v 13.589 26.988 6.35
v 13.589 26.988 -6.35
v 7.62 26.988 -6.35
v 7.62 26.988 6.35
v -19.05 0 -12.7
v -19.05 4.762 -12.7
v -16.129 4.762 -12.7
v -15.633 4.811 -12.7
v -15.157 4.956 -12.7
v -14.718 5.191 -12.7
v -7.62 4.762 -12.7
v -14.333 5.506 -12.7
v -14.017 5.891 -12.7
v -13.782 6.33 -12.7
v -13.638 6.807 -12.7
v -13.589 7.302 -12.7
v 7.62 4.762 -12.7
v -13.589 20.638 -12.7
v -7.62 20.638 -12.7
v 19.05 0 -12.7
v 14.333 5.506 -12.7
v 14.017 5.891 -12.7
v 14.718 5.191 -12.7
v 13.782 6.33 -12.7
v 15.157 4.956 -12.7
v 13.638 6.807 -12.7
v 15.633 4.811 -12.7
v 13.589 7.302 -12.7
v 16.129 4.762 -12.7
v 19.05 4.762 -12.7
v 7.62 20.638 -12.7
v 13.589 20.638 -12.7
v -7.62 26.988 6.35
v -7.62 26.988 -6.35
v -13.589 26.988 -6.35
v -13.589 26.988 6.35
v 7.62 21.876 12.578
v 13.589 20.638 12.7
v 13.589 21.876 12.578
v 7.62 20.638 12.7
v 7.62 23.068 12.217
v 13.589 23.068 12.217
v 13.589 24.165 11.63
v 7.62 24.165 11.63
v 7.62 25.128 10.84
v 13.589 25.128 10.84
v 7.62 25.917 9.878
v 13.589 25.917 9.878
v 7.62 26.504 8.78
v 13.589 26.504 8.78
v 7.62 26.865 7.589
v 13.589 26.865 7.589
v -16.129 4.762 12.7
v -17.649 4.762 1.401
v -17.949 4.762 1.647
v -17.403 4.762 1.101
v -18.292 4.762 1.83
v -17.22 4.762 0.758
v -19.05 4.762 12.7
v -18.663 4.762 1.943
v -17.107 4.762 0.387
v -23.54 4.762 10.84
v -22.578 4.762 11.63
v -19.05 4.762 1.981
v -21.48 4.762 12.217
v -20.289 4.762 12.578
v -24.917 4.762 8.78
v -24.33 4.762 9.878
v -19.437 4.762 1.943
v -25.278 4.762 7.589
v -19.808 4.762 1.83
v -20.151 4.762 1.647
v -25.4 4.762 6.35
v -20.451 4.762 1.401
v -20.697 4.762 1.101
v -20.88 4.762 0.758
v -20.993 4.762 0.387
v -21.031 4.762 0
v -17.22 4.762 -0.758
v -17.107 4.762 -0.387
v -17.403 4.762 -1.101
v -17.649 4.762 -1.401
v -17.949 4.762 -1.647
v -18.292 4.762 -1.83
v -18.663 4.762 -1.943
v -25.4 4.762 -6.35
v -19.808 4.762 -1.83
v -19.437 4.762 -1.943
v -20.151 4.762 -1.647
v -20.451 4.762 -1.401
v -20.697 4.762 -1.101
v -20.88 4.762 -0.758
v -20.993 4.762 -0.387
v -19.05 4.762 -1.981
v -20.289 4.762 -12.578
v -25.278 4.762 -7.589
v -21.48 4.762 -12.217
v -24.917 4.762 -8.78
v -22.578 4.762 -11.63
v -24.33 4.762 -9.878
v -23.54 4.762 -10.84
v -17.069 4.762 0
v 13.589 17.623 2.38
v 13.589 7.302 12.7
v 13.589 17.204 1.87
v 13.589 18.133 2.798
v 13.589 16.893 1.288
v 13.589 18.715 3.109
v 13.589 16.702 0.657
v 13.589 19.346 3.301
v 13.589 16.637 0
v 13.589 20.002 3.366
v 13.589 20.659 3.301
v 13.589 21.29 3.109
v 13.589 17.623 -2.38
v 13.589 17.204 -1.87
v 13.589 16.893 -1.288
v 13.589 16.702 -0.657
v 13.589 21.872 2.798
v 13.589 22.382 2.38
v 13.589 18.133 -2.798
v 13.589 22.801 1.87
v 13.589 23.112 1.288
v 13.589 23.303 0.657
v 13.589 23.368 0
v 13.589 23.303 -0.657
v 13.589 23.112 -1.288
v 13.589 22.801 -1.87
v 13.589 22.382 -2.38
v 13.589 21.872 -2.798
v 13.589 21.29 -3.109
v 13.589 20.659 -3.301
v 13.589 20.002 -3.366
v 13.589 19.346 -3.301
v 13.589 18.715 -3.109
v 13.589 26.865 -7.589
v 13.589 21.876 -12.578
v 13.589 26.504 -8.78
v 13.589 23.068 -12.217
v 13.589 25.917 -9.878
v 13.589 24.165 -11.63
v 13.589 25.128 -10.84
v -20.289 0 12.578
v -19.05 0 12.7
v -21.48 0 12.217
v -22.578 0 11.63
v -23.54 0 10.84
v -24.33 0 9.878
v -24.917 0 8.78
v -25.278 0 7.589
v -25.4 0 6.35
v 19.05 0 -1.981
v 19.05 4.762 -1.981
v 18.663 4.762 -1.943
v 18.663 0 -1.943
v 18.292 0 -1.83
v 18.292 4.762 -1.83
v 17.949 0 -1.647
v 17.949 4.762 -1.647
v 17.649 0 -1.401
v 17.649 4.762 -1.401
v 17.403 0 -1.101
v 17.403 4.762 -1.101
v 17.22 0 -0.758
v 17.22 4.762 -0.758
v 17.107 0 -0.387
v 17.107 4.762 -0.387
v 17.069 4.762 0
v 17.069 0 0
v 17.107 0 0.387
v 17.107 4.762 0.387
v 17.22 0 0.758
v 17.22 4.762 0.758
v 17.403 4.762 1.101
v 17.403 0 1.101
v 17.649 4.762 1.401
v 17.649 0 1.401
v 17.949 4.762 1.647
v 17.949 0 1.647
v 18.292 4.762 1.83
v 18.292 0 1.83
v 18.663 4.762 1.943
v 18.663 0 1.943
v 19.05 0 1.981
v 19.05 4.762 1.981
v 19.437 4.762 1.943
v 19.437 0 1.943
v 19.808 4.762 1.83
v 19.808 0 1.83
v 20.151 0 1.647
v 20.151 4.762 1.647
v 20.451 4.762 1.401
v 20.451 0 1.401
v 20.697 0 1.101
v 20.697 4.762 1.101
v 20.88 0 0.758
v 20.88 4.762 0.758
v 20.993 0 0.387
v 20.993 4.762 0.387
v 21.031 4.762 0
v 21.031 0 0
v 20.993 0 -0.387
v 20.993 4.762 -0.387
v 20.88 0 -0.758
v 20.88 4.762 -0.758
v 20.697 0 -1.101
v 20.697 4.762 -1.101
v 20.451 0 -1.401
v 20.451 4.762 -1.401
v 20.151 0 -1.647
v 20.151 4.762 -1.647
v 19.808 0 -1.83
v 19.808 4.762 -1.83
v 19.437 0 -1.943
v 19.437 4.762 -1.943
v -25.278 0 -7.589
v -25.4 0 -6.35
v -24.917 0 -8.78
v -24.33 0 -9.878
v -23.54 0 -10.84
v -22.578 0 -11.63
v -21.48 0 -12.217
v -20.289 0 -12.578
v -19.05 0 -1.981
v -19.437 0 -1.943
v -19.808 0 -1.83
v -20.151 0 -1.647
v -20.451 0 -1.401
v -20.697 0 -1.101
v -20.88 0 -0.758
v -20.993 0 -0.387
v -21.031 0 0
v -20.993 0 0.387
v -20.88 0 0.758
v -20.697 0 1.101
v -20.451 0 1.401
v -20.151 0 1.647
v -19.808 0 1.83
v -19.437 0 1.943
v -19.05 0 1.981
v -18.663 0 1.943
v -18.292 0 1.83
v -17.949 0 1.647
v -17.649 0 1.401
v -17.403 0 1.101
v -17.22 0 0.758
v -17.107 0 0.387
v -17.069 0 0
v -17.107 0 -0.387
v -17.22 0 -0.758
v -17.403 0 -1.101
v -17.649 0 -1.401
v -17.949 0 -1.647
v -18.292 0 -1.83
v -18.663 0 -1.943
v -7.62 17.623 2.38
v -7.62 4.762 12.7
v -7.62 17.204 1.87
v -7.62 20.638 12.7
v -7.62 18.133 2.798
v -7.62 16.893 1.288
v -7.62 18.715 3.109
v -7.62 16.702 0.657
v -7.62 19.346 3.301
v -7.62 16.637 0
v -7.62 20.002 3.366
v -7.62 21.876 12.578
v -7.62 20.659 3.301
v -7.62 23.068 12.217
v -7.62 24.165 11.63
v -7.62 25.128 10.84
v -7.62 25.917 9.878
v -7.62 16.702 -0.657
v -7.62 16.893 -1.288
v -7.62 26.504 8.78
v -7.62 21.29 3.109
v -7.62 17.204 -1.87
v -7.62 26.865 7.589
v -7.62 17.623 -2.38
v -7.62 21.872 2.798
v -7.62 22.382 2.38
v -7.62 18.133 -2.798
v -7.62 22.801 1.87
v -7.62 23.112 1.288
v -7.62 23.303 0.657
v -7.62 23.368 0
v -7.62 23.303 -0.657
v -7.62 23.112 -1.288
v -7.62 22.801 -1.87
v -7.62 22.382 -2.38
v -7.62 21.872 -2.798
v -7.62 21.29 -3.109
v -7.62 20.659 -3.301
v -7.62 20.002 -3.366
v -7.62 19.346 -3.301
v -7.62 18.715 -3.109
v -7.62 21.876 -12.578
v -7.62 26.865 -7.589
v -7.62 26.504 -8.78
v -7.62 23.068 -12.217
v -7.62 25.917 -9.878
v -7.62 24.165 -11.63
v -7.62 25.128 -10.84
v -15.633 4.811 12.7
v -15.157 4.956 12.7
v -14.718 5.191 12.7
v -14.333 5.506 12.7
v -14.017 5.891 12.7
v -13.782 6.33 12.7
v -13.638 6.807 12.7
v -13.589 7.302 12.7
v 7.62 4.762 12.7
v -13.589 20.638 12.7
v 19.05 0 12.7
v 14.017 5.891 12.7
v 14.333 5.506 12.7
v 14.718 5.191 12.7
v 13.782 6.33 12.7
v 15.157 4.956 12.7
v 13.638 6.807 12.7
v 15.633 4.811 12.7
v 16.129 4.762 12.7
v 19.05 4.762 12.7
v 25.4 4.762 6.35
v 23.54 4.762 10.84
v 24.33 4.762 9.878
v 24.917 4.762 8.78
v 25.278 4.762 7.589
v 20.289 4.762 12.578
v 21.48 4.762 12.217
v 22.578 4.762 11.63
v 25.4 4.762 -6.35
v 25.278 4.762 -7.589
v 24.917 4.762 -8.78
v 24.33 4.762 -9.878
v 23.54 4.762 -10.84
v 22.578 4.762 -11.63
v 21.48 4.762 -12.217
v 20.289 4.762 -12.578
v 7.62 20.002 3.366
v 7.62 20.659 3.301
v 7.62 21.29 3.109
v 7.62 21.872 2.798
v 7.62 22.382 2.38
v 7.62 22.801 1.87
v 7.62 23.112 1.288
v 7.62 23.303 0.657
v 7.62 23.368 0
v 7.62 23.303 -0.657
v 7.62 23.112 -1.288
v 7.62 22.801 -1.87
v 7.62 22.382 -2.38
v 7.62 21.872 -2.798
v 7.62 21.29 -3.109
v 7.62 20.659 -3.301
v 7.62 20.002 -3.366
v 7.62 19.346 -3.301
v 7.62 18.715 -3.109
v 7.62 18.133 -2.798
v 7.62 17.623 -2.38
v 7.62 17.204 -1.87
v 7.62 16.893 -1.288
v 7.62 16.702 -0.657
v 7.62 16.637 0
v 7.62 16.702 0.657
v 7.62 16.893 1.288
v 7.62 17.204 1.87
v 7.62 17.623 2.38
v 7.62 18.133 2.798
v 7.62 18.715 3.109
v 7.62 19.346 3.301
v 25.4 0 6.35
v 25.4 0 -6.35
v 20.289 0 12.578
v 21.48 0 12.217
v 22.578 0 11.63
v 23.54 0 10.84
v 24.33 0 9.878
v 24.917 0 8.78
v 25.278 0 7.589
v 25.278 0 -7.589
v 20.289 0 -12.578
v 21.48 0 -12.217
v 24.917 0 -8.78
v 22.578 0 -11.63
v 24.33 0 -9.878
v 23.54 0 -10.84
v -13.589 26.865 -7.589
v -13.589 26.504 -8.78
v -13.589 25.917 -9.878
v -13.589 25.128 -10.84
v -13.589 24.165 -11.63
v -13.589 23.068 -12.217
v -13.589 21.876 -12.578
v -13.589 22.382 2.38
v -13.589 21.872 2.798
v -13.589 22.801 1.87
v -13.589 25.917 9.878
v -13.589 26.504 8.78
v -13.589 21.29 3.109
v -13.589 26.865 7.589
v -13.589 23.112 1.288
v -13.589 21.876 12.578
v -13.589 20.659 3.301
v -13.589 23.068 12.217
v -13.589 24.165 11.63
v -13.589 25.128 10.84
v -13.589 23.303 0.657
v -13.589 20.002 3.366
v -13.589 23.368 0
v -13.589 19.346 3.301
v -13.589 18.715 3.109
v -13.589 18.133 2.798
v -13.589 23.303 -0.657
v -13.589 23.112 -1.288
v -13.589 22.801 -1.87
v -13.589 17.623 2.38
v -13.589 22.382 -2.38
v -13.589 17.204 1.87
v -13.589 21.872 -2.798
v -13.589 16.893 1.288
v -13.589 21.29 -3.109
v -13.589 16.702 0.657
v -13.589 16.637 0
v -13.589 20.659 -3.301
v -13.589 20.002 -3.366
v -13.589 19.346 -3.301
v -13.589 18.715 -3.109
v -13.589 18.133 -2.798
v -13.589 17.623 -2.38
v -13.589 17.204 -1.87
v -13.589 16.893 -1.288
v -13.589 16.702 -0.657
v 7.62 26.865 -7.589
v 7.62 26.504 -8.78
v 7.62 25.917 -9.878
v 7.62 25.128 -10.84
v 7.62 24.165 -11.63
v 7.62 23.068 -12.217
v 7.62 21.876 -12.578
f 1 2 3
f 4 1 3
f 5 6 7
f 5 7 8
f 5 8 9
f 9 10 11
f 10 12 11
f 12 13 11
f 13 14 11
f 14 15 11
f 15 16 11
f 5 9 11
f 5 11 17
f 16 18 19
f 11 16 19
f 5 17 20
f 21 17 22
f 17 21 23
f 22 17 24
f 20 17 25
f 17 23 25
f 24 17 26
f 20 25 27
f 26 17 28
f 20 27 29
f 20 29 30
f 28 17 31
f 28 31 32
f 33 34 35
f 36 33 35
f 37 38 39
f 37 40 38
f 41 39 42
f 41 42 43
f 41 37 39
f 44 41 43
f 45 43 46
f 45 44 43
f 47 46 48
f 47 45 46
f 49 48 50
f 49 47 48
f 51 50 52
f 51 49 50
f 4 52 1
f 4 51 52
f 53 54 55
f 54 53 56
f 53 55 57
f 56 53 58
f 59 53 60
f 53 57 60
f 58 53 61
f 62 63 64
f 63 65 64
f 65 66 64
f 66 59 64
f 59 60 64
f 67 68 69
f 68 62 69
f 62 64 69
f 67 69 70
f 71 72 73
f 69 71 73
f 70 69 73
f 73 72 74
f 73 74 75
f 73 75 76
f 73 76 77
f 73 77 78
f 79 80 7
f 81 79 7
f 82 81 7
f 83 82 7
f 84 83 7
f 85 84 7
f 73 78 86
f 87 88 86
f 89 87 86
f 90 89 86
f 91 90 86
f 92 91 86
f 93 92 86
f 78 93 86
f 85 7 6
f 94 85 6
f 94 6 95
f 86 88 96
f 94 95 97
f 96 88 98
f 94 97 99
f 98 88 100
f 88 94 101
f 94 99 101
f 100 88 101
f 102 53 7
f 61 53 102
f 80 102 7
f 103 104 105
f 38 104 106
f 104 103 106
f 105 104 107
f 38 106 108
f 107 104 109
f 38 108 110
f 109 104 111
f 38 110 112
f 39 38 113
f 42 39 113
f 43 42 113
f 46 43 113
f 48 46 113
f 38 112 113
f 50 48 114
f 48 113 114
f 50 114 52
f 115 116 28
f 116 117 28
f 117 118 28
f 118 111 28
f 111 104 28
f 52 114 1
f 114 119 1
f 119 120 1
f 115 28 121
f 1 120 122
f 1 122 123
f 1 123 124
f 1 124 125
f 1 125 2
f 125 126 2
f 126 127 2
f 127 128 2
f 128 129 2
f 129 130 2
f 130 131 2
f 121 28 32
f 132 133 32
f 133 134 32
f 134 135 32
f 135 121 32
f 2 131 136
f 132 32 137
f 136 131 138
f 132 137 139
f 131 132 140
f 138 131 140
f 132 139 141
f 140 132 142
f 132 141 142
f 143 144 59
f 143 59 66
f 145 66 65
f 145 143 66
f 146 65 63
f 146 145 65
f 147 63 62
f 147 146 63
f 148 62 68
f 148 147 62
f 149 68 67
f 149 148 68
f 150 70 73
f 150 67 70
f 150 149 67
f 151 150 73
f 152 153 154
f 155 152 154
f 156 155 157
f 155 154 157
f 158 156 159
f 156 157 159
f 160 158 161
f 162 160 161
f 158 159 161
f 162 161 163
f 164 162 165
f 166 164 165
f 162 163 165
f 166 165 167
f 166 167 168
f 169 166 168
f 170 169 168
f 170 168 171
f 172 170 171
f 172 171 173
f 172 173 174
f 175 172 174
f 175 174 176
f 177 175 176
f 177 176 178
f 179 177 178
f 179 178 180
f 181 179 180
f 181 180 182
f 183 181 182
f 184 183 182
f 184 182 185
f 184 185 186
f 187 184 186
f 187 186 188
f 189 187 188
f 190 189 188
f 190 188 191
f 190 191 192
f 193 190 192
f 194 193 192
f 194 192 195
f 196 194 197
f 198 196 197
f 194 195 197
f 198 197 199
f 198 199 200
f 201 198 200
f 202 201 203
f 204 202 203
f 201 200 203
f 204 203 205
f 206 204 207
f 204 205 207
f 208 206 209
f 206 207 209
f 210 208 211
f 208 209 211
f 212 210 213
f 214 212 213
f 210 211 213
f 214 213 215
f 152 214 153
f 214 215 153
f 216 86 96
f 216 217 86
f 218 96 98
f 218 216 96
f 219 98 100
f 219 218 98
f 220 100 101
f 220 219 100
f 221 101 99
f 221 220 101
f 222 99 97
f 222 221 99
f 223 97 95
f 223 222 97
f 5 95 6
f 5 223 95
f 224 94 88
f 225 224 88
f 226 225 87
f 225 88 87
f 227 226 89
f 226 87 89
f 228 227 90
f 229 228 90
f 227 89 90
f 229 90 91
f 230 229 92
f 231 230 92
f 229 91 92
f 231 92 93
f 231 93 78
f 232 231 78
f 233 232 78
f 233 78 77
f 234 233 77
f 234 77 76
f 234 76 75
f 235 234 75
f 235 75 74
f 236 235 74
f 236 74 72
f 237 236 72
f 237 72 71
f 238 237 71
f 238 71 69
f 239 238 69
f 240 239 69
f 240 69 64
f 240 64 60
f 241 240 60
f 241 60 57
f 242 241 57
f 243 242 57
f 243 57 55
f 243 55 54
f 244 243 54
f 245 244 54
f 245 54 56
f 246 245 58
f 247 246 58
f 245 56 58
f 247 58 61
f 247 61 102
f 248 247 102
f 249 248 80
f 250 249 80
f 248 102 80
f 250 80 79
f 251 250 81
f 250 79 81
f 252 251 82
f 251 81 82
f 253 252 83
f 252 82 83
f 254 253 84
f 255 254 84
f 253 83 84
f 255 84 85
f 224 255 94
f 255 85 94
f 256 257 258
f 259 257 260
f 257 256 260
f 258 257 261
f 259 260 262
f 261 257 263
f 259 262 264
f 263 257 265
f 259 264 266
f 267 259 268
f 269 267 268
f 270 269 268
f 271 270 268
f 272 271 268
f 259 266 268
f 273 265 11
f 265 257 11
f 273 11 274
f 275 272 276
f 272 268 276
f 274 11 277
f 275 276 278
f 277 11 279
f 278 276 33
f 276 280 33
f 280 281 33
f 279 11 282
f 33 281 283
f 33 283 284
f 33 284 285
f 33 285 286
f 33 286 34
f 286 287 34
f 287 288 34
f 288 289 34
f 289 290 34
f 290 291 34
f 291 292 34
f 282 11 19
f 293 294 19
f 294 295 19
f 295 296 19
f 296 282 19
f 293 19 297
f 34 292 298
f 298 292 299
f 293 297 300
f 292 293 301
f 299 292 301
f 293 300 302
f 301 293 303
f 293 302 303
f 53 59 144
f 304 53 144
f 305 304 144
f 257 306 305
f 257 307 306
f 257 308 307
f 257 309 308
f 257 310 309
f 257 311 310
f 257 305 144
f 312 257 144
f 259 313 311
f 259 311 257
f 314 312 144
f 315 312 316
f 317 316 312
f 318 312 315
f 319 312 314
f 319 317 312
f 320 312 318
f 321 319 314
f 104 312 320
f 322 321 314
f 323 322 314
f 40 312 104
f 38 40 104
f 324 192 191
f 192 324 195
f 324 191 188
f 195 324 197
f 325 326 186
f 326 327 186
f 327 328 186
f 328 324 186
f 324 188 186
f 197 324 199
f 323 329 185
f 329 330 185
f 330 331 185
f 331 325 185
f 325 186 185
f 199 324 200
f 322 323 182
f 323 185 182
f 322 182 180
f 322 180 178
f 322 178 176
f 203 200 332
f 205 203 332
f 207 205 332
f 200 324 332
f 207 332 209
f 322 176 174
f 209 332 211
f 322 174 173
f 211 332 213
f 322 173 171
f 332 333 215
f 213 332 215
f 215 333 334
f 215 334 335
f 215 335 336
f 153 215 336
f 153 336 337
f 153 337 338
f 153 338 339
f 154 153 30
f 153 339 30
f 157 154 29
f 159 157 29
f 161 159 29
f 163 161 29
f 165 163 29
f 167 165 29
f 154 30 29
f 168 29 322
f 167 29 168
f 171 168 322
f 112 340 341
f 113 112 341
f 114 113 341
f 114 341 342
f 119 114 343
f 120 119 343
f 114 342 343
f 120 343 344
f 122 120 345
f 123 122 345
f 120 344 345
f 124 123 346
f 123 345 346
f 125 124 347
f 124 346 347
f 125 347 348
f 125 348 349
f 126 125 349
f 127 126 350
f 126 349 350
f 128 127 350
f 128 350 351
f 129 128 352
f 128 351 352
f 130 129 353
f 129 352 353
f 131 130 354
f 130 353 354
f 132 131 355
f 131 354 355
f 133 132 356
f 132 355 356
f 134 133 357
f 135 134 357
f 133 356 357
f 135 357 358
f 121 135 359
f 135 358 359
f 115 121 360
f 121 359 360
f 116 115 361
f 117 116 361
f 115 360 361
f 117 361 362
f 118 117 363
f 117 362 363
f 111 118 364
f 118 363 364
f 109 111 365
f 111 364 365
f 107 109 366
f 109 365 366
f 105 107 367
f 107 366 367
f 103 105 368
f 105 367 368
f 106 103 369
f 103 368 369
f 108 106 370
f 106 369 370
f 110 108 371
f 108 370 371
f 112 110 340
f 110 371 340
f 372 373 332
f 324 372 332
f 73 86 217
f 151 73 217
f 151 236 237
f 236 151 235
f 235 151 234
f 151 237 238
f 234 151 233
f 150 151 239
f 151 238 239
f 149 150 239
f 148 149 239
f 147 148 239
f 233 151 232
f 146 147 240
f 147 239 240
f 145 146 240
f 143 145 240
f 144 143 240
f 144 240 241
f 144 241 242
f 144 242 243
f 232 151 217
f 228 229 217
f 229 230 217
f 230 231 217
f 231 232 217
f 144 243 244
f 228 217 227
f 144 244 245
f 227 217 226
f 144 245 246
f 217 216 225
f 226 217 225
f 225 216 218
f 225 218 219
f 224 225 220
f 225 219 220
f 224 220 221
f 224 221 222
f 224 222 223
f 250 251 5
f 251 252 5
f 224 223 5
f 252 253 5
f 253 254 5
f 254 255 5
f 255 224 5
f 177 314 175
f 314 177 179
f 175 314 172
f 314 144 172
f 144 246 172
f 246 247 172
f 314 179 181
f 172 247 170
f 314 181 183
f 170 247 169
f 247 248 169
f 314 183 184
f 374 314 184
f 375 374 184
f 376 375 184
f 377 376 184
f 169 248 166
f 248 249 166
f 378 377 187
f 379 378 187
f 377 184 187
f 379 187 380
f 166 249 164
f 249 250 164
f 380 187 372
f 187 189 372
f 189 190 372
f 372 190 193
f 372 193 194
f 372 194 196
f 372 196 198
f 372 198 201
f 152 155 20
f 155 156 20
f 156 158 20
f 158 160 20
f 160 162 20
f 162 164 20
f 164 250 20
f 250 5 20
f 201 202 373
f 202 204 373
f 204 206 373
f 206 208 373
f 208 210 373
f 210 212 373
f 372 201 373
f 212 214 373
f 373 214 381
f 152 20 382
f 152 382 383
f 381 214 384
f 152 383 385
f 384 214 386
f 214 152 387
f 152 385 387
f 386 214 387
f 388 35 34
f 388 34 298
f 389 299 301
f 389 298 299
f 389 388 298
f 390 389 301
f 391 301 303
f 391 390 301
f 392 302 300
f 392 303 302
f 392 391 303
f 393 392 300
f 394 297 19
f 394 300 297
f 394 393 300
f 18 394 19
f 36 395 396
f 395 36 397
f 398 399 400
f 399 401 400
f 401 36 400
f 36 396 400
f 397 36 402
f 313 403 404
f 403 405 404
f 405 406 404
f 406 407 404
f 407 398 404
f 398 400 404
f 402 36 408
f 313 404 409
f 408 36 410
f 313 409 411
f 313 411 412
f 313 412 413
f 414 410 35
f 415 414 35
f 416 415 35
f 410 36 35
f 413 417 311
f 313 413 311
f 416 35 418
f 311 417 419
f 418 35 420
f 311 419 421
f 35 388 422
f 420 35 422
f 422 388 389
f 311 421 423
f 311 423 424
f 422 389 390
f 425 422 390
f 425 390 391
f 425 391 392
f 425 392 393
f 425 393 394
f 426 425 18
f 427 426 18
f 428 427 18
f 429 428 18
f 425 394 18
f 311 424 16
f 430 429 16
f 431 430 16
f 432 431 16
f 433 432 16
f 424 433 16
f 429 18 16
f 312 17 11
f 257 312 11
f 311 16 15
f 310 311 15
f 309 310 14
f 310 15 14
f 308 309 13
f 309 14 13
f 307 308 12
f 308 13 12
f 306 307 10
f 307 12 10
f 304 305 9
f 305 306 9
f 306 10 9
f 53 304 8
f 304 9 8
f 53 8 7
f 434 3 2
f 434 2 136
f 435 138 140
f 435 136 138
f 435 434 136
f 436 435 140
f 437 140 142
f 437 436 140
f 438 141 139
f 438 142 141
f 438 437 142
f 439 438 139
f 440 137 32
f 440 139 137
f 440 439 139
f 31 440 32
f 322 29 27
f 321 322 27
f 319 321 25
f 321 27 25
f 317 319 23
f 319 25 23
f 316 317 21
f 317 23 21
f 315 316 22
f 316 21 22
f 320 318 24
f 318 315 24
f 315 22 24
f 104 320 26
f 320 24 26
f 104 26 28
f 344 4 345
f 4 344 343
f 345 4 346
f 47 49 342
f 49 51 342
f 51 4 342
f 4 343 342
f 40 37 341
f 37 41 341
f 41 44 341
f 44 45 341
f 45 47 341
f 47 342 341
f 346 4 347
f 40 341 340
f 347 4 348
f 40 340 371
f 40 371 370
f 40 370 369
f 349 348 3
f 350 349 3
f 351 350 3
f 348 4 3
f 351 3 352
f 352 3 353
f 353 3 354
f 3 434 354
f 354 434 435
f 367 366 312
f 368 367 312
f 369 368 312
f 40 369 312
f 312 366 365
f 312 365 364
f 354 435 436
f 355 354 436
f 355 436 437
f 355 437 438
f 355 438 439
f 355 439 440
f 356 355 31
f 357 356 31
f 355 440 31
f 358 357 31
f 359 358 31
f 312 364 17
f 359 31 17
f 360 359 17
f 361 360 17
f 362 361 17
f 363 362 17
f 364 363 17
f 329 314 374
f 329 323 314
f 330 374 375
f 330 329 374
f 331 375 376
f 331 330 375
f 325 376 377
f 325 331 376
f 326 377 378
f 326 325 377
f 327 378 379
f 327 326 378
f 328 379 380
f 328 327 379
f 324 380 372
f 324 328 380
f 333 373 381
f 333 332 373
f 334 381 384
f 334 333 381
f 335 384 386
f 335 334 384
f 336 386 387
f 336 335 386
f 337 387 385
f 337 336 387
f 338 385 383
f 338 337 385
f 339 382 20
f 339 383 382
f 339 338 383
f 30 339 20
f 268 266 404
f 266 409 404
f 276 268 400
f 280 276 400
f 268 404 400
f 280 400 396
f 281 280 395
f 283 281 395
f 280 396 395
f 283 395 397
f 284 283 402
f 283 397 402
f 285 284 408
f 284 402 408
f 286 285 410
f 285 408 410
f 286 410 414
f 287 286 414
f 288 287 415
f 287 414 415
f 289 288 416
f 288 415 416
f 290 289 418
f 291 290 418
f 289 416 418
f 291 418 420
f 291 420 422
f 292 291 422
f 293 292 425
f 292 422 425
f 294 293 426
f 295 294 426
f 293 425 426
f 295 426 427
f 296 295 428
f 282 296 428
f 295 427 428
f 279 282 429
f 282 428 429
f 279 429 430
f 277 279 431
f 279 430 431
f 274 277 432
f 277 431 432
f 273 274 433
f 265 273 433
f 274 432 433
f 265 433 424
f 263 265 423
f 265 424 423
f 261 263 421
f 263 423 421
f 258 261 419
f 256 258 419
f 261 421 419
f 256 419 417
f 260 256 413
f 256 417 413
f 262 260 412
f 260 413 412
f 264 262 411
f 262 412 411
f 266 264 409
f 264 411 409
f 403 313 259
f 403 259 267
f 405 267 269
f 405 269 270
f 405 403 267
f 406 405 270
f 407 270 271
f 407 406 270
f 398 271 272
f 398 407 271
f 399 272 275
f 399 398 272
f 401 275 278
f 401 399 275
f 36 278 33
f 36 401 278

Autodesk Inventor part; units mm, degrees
ref_plane "YZ Plane" through (0, 0, 0) normal (1, 0, 0) x (0, 1, 0)
ref_plane "XY Plane" through (0, 0, 0) normal (0, 0, 1) x (1, 0, 0)
sketch "Sketch1" plane through (0, 0, 0) normal (0, 0, 1) x (1, 0, 0)
  line L0 (-25.4, 4.7625) -> (-25.4, 0)
  line L1 (-25.4, 0) -> (25.4, 0)
  line L2 (25.4, 0) -> (25.4, 4.7625)
  line L3 (25.4, 4.7625) -> (-25.4, 0) construction
  line L4 (-25.4, 4.7625) -> (25.4, 0) construction
  line L5 (-7.62, 4.7625) -> (-7.62, 26.9875)
  line L6 (-7.62, 26.9875) -> (-13.589, 26.9875)
  line L7 (-13.589, 26.9875) -> (-13.589, 7.3025)
  line L8 (13.589, 7.3025) -> (13.589, 26.9875)
  line L9 (13.589, 26.9875) -> (7.62, 26.9875)
  line L10 (7.62, 26.9875) -> (7.62, 4.7625)
  line L11 (0, 4.7625) -> (0, 30.1851) construction
  line L12 (-16.129, 4.7625) -> (-25.4, 4.7625)
  line L13 (25.4, 4.7625) -> (16.129, 4.7625)
  line L14 (7.62, 4.7625) -> (-7.62, 4.7625)
  arc A0 (-16.129, 4.7625) -> (-13.589, 7.3025) centre (-16.129, 7.3025) ccw
  arc A1 (13.589, 7.3025) -> (16.129, 4.7625) centre (16.129, 7.3025) ccw
  point P0 (0, 0)
  point P1 (0, 2.3812)
  point P2 (0, 0)
  dimension "d0" = 26.9875
  dimension "d2" = 50.8
  dimension "d3" = 5.969
  dimension "d4" = 15.24
  dimension "d5" = 2.54
  dimension "d6" = 4.7625
extrude "Extrusion1" add sketch "Sketch1" along normal mid plane 25.4
fillet "Fillet1" radius 6.35 8 edges at (-10.6045, 26.9875, 12.7) (10.6045, 26.9875, 12.7) (-10.6045, 26.9875, -12.7) (10.6045, 26.9875, -12.7) (25.4, 2.3813, 12.7) (25.4, 2.3813, -12.7) (-25.4, 2.3813, 12.7) (-25.4, 2.3813, -12.7)
sketch "Sketch2" plane through (-13.589, 7.3025, -12.7) normal (-1, 0, 0) x (0, 0, 1)
  circle A0 centre (12.7, 12.7) radius 3.3655
  line L0 (6.35, -7.3025) -> (19.05, -7.3025) projected
  point P0 (12.7, -7.3025)
  point P1 (25.4, -2.54)
  point P2 (12.7, -7.3025)
  dimension "d10" = 6.731
  dimension "d11" = 15.24
extrude "Extrusion2" cut sketch "Sketch2" against normal through all
sketch "Sketch3" plane through (-19.05, 0, -12.7) normal (0, -1, 0) x (1, 0, 0)
  line L0 (0, 12.7) -> (38.1, 12.7) construction
  circle A0 centre (0, 12.7) radius 2.0193
  circle A1 centre (38.1, 12.7) radius 2.0193
  point P0 (19.05, 12.7)
  point P1 (19.05, 12.7)
  dimension "d14" = 4.0386
  dimension "d15" = 38.1
hole "Hole1" at (-19.05, 0, 0) at (19.05, 0, 0) direction (0, 1, 0) diameter 3.9624 end through all thread size "10-32 UNF" class "2B" standard "ANSI Unified Screw Threads"
ref_plane "Work Plane1" through (-13.589, 20.0025, 0) normal (0, 1, 0) x (1, 0, 0)
properties part number "TTB 4mm Dyneema Cable Pulley Bracket (ELEV-PULLEY-001)" material "Aluminum 6061"
